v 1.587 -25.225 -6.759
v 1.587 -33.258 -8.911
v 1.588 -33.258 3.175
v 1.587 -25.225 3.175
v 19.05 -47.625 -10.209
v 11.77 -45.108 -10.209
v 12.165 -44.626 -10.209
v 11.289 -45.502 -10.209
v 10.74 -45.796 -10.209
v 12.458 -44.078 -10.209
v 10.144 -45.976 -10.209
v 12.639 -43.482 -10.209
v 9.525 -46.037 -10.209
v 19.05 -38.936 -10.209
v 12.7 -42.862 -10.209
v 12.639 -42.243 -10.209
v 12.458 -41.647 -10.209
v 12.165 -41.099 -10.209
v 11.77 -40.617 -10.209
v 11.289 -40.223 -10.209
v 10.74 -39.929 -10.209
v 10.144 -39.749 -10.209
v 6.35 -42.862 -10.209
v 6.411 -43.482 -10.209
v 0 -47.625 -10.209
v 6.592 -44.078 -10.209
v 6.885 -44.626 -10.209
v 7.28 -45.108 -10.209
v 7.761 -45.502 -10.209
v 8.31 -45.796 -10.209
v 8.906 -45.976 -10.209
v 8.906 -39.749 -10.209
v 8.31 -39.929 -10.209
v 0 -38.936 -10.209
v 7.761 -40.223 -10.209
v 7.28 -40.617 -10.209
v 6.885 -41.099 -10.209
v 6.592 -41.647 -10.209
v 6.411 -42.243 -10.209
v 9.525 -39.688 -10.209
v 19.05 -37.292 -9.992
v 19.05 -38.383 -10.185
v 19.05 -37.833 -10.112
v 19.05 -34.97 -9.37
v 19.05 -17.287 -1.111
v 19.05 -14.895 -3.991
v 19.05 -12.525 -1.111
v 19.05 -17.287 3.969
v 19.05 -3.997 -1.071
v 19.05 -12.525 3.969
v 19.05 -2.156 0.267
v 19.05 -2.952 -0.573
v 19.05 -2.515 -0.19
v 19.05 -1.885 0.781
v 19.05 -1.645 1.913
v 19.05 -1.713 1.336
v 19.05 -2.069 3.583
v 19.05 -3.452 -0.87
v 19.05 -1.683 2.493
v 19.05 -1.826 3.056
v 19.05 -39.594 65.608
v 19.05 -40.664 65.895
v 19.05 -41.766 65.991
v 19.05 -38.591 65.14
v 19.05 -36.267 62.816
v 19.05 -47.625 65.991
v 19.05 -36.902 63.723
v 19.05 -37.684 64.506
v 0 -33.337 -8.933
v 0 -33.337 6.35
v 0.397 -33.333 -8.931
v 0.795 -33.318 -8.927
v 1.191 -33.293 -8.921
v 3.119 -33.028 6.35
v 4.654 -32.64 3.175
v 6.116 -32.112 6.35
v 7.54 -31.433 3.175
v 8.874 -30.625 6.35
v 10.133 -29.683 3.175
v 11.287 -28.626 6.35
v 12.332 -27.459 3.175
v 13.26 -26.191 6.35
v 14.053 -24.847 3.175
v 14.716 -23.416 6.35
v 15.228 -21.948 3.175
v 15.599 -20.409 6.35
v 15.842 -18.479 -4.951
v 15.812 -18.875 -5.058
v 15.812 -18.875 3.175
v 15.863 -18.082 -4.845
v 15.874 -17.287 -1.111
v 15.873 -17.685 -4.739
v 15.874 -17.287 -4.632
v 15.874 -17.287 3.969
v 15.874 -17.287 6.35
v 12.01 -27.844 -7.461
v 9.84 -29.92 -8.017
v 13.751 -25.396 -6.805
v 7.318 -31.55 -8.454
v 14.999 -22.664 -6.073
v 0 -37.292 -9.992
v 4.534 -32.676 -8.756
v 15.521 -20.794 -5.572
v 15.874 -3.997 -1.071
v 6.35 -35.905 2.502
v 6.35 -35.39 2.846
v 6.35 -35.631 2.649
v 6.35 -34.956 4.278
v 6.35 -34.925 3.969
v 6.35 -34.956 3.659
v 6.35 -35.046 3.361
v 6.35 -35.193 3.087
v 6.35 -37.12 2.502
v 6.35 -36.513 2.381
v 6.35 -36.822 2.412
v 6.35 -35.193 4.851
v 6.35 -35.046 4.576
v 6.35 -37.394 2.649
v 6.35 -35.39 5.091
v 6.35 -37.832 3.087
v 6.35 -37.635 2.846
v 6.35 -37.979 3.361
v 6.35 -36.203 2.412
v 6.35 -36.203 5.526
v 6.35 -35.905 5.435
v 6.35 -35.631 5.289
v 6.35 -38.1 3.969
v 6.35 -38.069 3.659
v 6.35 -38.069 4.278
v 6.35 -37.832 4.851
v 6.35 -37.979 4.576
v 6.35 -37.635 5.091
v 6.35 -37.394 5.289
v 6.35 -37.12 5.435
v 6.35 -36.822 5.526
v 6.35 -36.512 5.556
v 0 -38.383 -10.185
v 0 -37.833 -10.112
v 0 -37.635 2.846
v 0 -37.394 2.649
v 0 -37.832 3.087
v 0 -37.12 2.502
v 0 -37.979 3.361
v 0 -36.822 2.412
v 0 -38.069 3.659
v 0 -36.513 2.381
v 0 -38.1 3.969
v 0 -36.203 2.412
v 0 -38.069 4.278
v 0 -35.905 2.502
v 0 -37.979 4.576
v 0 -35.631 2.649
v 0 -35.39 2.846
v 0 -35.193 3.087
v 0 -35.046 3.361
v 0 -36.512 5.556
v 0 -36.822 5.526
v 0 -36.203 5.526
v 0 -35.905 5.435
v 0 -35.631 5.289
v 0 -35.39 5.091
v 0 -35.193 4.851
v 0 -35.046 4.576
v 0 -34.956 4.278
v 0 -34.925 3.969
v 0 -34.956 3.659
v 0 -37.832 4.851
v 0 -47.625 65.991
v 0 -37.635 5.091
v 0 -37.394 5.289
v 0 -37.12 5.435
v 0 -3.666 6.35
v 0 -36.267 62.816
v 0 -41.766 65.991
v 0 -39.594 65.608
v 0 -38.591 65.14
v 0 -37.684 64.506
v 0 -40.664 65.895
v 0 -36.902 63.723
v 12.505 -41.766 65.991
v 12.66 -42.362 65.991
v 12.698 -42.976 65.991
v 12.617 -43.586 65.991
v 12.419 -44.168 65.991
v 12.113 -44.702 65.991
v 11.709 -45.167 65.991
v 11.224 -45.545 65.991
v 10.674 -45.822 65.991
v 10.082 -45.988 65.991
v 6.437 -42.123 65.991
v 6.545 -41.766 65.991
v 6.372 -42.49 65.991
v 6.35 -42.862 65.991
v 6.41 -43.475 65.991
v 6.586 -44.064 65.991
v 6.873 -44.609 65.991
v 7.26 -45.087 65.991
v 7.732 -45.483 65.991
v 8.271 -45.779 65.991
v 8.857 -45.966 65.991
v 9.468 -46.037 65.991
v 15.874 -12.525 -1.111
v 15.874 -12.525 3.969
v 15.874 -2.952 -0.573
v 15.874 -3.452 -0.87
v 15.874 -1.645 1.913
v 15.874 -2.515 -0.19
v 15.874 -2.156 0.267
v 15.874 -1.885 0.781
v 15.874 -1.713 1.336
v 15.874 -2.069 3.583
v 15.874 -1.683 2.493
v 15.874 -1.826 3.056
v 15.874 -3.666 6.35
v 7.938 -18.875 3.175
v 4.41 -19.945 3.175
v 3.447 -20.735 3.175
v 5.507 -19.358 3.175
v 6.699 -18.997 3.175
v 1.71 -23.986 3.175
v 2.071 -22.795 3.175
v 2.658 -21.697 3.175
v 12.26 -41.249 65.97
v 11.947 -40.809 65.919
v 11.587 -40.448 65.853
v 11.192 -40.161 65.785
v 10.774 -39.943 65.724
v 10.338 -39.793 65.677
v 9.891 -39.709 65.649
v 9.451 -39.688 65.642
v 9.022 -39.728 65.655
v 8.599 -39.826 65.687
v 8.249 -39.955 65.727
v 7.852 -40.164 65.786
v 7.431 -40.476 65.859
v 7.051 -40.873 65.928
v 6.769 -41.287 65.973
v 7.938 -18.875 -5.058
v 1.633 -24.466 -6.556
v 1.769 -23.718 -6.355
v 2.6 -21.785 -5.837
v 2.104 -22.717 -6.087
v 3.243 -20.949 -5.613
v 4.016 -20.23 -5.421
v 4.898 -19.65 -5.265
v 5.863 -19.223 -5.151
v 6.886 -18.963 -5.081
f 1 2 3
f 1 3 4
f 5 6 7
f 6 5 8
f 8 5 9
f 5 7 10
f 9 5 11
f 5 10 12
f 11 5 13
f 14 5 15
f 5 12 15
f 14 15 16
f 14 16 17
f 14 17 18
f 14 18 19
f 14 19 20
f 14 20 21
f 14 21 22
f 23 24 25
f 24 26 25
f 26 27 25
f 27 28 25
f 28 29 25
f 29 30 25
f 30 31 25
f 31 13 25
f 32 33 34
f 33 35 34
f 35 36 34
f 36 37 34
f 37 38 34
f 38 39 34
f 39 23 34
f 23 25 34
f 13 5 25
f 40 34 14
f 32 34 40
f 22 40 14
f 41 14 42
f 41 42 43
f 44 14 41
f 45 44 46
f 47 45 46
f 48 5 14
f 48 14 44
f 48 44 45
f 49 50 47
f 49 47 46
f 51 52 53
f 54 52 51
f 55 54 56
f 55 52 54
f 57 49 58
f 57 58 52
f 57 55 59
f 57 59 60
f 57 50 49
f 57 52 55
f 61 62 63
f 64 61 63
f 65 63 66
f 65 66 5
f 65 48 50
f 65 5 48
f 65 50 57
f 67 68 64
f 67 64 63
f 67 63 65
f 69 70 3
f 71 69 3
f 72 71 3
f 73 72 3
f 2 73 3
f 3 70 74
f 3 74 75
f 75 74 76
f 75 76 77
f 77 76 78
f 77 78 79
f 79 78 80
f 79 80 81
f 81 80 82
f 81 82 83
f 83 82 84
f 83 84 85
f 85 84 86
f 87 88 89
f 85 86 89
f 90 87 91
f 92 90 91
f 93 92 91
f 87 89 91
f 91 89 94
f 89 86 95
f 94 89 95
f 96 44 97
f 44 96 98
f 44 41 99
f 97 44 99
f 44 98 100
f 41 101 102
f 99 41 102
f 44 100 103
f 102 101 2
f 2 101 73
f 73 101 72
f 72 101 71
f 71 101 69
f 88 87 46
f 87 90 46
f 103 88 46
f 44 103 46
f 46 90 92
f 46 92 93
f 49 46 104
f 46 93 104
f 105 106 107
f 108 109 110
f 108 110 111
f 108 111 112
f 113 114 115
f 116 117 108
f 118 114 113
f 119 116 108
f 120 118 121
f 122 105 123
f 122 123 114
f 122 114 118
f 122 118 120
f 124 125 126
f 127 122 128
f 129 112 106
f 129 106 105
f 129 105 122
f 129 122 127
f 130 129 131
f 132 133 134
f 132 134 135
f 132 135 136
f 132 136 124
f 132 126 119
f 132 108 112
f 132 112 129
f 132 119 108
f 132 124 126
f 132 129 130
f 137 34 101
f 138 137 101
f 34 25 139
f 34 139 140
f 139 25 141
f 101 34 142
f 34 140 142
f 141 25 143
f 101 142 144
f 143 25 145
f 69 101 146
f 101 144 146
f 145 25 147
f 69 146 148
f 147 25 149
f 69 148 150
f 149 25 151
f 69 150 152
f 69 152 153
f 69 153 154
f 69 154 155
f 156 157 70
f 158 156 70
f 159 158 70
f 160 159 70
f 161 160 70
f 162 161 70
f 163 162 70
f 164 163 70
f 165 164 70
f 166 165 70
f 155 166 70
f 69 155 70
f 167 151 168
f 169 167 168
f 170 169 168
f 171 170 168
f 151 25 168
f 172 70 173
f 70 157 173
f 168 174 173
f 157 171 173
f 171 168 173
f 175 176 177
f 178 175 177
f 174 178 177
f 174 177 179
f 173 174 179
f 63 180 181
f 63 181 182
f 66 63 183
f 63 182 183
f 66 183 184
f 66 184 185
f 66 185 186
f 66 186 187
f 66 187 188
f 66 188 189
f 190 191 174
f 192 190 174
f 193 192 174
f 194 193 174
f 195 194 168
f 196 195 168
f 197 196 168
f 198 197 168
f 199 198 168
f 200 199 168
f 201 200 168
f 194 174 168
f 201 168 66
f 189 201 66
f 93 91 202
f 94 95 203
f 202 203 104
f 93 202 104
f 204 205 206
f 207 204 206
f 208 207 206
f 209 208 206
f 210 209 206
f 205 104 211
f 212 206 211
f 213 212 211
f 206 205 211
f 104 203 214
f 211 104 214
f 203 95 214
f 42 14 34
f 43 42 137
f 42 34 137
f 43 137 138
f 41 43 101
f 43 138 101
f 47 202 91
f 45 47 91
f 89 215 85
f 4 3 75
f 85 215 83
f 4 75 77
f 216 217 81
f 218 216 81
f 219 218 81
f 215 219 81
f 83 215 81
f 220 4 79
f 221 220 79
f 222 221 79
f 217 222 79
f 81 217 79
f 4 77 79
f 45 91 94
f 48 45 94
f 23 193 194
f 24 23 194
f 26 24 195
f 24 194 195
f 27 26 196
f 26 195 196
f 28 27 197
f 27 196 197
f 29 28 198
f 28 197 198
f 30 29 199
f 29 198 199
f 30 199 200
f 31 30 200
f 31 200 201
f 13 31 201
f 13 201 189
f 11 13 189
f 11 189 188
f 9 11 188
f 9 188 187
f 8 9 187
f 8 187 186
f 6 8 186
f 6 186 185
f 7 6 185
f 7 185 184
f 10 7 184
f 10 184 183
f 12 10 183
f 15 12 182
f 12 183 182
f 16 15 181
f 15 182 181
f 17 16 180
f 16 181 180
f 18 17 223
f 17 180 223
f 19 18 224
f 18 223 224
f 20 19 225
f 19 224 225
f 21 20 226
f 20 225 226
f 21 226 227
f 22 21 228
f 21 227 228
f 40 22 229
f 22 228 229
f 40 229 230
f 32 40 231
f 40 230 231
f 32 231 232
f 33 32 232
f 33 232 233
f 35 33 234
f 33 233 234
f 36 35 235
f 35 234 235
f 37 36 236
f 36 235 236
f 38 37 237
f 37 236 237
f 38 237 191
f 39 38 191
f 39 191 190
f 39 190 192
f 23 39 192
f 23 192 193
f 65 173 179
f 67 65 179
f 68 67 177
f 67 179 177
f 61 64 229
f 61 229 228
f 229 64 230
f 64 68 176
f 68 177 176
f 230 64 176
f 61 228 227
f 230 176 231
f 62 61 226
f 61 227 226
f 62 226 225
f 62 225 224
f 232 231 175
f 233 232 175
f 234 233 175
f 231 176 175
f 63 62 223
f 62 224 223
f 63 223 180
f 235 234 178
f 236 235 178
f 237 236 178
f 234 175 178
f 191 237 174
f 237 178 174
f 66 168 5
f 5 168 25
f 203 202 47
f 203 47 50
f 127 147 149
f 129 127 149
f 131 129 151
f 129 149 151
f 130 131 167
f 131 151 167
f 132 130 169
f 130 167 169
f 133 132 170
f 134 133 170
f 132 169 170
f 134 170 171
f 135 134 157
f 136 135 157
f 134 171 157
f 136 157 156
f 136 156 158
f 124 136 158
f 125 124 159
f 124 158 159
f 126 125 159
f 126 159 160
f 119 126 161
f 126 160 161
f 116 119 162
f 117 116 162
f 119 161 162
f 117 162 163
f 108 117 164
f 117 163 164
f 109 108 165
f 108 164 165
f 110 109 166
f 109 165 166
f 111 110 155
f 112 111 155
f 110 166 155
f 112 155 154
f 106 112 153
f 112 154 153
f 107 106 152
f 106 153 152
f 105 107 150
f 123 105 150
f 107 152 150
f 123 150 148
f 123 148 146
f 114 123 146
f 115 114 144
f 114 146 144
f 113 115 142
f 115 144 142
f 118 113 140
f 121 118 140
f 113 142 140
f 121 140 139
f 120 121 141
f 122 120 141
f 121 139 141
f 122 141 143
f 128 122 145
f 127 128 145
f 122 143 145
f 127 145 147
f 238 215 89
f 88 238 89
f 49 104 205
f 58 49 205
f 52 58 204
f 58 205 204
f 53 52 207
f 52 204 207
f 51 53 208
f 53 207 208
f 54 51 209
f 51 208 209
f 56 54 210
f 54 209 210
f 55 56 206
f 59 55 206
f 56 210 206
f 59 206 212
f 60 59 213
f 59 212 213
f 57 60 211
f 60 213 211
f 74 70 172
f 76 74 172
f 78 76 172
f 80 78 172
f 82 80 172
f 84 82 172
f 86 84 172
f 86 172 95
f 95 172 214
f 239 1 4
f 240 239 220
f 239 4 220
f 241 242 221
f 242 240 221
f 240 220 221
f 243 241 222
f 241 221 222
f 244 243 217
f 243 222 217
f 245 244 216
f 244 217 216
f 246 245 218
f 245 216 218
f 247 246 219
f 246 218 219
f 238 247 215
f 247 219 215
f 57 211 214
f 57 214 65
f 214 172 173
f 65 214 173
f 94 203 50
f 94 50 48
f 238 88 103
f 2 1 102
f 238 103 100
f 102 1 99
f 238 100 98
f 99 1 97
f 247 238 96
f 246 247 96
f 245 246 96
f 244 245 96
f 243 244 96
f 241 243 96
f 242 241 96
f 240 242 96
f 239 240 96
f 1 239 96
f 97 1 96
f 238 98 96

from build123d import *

# Parameters (mm, degrees)
F1_DEPTH      = 19.05
F3_D          = 6.35
F5_DEPTH      = 6.35
F5_DEPTH_BACK = 10.2098643316
F6_W          = 4.7625
F6_H          = 5.08
F7_DEPTH      = 25.4
F8_R          = 1.5875
F9_DEPTH      = 6.35
F11_START     = 3.175
F11_DEPTH     = 15.875
F13_DEPTH     = 19.0510001


with BuildPart() as f1:
    # F0 (on Right) → F1 (new body)
    with BuildSketch(Plane.YZ):
        with BuildLine():
            ThreePointArc((-3.9967504682, -1.0709260603), (-1.8851834207, 0.7808685404), (-2.0688702794, 3.5833884382))
            Line((-2.0688702794, 3.5833884382), (-36.2669128953, 62.8161357684))
            ThreePointArc((-36.2669128953, 62.8161357684), (-38.5911742094, 65.1403970824), (-41.7661742094, 65.9911357684))
            Line((-41.7661742094, 65.9911357684), (-47.625, 65.9911357684))
            Line((-47.625, 65.9911357684), (-47.625, -10.2088642316))
            Line((-47.625, -10.2088642316), (-38.9359933597, -10.2088642316))
            ThreePointArc((-38.9359933597, -10.2088642316), (-38.1071520391, -10.1545391013), (-37.2924924233, -9.9924932286))
            Line((-37.2924924233, -9.9924932286), (-3.9967504682, -1.0709260603))
        make_face()
    extrude(amount=F1_DEPTH)

    # F3 (through all)
    with Locations(Plane(origin=(0, 0, -10.2088642316), x_dir=(1, 0, 0), z_dir=(0, 0, -1))):
        with Locations((9.525, 42.8625)):
            Hole(F3_D / 2)

    # F4 (on Top) → F5 (cut, two sides)
    with BuildSketch(Plane.XY) as f5_sk:
        with BuildLine():
            Line((15.8740343467, -1.5875), (0, -1.5875))
            ThreePointArc((0, -1.5875), (-11.1632427706, -28.7495561195), (15.8740343467, -17.2874041455))
            Line((15.8740343467, -17.2874041455), (15.8740343467, -10.9579507262))
            Line((15.8740343467, -10.9579507262), (15.8740343467, -1.5875))
        make_face()
    extrude(amount=F5_DEPTH, mode=Mode.SUBTRACT)
    extrude(f5_sk.sketch, amount=-F5_DEPTH_BACK, mode=Mode.SUBTRACT)

    # F6 (on face) → F7 (cut)
    with BuildSketch(Plane(origin=(15.8740343467, 0, 0), x_dir=(0, -1, 0), z_dir=(-1, 0, 0))):
        with Locations((14.9061541455, 1.42875)):
            Rectangle(F6_W, F6_H)
    extrude(amount=-F7_DEPTH, mode=Mode.SUBTRACT)

    # F8 (on face) → F9 (cut)
    with BuildSketch(Plane(origin=(0, 0, 0), x_dir=(0, -1, 0), z_dir=(-1, 0, 0))):
        with Locations((36.5125, 3.96875)):
            Circle(F8_R)
    extrude(amount=-F9_DEPTH, mode=Mode.SUBTRACT)

    # F10 (on face) → F11 (join)
    with BuildSketch(Plane(origin=(0, 0, 6.35), x_dir=(1, 0, 0), z_dir=(0, 0, -1)).offset(F11_START)):
        with BuildLine():
            ThreePointArc((1.5875, 25.2249041455), (3.4473719395, 20.7347760849), (7.9375, 18.8749041455))
            Line((7.9375, 18.8749041455), (15.8120441288, 18.8749041455))
            ThreePointArc((15.8120441288, 18.8749041455), (11.2873318483, 28.6254639767), (1.5875, 33.2579255641))
            Line((1.5875, 33.2579255641), (1.5875, 25.2249041455))
        make_face()
    extrude(amount=F11_DEPTH)

    # F12 (on face) → F13 (cut, through all)
    with BuildSketch(Plane.YZ.offset(19.05)):
        Polygon((-14.8947556834, -3.9910377568), (-34.9698544916, -9.3701442705), (-35.4003421962, -17.2549132258), (-14.8947556834, -17.2549132258), align=None)
    extrude(amount=-F13_DEPTH, mode=Mode.SUBTRACT)


solid = f1.part
